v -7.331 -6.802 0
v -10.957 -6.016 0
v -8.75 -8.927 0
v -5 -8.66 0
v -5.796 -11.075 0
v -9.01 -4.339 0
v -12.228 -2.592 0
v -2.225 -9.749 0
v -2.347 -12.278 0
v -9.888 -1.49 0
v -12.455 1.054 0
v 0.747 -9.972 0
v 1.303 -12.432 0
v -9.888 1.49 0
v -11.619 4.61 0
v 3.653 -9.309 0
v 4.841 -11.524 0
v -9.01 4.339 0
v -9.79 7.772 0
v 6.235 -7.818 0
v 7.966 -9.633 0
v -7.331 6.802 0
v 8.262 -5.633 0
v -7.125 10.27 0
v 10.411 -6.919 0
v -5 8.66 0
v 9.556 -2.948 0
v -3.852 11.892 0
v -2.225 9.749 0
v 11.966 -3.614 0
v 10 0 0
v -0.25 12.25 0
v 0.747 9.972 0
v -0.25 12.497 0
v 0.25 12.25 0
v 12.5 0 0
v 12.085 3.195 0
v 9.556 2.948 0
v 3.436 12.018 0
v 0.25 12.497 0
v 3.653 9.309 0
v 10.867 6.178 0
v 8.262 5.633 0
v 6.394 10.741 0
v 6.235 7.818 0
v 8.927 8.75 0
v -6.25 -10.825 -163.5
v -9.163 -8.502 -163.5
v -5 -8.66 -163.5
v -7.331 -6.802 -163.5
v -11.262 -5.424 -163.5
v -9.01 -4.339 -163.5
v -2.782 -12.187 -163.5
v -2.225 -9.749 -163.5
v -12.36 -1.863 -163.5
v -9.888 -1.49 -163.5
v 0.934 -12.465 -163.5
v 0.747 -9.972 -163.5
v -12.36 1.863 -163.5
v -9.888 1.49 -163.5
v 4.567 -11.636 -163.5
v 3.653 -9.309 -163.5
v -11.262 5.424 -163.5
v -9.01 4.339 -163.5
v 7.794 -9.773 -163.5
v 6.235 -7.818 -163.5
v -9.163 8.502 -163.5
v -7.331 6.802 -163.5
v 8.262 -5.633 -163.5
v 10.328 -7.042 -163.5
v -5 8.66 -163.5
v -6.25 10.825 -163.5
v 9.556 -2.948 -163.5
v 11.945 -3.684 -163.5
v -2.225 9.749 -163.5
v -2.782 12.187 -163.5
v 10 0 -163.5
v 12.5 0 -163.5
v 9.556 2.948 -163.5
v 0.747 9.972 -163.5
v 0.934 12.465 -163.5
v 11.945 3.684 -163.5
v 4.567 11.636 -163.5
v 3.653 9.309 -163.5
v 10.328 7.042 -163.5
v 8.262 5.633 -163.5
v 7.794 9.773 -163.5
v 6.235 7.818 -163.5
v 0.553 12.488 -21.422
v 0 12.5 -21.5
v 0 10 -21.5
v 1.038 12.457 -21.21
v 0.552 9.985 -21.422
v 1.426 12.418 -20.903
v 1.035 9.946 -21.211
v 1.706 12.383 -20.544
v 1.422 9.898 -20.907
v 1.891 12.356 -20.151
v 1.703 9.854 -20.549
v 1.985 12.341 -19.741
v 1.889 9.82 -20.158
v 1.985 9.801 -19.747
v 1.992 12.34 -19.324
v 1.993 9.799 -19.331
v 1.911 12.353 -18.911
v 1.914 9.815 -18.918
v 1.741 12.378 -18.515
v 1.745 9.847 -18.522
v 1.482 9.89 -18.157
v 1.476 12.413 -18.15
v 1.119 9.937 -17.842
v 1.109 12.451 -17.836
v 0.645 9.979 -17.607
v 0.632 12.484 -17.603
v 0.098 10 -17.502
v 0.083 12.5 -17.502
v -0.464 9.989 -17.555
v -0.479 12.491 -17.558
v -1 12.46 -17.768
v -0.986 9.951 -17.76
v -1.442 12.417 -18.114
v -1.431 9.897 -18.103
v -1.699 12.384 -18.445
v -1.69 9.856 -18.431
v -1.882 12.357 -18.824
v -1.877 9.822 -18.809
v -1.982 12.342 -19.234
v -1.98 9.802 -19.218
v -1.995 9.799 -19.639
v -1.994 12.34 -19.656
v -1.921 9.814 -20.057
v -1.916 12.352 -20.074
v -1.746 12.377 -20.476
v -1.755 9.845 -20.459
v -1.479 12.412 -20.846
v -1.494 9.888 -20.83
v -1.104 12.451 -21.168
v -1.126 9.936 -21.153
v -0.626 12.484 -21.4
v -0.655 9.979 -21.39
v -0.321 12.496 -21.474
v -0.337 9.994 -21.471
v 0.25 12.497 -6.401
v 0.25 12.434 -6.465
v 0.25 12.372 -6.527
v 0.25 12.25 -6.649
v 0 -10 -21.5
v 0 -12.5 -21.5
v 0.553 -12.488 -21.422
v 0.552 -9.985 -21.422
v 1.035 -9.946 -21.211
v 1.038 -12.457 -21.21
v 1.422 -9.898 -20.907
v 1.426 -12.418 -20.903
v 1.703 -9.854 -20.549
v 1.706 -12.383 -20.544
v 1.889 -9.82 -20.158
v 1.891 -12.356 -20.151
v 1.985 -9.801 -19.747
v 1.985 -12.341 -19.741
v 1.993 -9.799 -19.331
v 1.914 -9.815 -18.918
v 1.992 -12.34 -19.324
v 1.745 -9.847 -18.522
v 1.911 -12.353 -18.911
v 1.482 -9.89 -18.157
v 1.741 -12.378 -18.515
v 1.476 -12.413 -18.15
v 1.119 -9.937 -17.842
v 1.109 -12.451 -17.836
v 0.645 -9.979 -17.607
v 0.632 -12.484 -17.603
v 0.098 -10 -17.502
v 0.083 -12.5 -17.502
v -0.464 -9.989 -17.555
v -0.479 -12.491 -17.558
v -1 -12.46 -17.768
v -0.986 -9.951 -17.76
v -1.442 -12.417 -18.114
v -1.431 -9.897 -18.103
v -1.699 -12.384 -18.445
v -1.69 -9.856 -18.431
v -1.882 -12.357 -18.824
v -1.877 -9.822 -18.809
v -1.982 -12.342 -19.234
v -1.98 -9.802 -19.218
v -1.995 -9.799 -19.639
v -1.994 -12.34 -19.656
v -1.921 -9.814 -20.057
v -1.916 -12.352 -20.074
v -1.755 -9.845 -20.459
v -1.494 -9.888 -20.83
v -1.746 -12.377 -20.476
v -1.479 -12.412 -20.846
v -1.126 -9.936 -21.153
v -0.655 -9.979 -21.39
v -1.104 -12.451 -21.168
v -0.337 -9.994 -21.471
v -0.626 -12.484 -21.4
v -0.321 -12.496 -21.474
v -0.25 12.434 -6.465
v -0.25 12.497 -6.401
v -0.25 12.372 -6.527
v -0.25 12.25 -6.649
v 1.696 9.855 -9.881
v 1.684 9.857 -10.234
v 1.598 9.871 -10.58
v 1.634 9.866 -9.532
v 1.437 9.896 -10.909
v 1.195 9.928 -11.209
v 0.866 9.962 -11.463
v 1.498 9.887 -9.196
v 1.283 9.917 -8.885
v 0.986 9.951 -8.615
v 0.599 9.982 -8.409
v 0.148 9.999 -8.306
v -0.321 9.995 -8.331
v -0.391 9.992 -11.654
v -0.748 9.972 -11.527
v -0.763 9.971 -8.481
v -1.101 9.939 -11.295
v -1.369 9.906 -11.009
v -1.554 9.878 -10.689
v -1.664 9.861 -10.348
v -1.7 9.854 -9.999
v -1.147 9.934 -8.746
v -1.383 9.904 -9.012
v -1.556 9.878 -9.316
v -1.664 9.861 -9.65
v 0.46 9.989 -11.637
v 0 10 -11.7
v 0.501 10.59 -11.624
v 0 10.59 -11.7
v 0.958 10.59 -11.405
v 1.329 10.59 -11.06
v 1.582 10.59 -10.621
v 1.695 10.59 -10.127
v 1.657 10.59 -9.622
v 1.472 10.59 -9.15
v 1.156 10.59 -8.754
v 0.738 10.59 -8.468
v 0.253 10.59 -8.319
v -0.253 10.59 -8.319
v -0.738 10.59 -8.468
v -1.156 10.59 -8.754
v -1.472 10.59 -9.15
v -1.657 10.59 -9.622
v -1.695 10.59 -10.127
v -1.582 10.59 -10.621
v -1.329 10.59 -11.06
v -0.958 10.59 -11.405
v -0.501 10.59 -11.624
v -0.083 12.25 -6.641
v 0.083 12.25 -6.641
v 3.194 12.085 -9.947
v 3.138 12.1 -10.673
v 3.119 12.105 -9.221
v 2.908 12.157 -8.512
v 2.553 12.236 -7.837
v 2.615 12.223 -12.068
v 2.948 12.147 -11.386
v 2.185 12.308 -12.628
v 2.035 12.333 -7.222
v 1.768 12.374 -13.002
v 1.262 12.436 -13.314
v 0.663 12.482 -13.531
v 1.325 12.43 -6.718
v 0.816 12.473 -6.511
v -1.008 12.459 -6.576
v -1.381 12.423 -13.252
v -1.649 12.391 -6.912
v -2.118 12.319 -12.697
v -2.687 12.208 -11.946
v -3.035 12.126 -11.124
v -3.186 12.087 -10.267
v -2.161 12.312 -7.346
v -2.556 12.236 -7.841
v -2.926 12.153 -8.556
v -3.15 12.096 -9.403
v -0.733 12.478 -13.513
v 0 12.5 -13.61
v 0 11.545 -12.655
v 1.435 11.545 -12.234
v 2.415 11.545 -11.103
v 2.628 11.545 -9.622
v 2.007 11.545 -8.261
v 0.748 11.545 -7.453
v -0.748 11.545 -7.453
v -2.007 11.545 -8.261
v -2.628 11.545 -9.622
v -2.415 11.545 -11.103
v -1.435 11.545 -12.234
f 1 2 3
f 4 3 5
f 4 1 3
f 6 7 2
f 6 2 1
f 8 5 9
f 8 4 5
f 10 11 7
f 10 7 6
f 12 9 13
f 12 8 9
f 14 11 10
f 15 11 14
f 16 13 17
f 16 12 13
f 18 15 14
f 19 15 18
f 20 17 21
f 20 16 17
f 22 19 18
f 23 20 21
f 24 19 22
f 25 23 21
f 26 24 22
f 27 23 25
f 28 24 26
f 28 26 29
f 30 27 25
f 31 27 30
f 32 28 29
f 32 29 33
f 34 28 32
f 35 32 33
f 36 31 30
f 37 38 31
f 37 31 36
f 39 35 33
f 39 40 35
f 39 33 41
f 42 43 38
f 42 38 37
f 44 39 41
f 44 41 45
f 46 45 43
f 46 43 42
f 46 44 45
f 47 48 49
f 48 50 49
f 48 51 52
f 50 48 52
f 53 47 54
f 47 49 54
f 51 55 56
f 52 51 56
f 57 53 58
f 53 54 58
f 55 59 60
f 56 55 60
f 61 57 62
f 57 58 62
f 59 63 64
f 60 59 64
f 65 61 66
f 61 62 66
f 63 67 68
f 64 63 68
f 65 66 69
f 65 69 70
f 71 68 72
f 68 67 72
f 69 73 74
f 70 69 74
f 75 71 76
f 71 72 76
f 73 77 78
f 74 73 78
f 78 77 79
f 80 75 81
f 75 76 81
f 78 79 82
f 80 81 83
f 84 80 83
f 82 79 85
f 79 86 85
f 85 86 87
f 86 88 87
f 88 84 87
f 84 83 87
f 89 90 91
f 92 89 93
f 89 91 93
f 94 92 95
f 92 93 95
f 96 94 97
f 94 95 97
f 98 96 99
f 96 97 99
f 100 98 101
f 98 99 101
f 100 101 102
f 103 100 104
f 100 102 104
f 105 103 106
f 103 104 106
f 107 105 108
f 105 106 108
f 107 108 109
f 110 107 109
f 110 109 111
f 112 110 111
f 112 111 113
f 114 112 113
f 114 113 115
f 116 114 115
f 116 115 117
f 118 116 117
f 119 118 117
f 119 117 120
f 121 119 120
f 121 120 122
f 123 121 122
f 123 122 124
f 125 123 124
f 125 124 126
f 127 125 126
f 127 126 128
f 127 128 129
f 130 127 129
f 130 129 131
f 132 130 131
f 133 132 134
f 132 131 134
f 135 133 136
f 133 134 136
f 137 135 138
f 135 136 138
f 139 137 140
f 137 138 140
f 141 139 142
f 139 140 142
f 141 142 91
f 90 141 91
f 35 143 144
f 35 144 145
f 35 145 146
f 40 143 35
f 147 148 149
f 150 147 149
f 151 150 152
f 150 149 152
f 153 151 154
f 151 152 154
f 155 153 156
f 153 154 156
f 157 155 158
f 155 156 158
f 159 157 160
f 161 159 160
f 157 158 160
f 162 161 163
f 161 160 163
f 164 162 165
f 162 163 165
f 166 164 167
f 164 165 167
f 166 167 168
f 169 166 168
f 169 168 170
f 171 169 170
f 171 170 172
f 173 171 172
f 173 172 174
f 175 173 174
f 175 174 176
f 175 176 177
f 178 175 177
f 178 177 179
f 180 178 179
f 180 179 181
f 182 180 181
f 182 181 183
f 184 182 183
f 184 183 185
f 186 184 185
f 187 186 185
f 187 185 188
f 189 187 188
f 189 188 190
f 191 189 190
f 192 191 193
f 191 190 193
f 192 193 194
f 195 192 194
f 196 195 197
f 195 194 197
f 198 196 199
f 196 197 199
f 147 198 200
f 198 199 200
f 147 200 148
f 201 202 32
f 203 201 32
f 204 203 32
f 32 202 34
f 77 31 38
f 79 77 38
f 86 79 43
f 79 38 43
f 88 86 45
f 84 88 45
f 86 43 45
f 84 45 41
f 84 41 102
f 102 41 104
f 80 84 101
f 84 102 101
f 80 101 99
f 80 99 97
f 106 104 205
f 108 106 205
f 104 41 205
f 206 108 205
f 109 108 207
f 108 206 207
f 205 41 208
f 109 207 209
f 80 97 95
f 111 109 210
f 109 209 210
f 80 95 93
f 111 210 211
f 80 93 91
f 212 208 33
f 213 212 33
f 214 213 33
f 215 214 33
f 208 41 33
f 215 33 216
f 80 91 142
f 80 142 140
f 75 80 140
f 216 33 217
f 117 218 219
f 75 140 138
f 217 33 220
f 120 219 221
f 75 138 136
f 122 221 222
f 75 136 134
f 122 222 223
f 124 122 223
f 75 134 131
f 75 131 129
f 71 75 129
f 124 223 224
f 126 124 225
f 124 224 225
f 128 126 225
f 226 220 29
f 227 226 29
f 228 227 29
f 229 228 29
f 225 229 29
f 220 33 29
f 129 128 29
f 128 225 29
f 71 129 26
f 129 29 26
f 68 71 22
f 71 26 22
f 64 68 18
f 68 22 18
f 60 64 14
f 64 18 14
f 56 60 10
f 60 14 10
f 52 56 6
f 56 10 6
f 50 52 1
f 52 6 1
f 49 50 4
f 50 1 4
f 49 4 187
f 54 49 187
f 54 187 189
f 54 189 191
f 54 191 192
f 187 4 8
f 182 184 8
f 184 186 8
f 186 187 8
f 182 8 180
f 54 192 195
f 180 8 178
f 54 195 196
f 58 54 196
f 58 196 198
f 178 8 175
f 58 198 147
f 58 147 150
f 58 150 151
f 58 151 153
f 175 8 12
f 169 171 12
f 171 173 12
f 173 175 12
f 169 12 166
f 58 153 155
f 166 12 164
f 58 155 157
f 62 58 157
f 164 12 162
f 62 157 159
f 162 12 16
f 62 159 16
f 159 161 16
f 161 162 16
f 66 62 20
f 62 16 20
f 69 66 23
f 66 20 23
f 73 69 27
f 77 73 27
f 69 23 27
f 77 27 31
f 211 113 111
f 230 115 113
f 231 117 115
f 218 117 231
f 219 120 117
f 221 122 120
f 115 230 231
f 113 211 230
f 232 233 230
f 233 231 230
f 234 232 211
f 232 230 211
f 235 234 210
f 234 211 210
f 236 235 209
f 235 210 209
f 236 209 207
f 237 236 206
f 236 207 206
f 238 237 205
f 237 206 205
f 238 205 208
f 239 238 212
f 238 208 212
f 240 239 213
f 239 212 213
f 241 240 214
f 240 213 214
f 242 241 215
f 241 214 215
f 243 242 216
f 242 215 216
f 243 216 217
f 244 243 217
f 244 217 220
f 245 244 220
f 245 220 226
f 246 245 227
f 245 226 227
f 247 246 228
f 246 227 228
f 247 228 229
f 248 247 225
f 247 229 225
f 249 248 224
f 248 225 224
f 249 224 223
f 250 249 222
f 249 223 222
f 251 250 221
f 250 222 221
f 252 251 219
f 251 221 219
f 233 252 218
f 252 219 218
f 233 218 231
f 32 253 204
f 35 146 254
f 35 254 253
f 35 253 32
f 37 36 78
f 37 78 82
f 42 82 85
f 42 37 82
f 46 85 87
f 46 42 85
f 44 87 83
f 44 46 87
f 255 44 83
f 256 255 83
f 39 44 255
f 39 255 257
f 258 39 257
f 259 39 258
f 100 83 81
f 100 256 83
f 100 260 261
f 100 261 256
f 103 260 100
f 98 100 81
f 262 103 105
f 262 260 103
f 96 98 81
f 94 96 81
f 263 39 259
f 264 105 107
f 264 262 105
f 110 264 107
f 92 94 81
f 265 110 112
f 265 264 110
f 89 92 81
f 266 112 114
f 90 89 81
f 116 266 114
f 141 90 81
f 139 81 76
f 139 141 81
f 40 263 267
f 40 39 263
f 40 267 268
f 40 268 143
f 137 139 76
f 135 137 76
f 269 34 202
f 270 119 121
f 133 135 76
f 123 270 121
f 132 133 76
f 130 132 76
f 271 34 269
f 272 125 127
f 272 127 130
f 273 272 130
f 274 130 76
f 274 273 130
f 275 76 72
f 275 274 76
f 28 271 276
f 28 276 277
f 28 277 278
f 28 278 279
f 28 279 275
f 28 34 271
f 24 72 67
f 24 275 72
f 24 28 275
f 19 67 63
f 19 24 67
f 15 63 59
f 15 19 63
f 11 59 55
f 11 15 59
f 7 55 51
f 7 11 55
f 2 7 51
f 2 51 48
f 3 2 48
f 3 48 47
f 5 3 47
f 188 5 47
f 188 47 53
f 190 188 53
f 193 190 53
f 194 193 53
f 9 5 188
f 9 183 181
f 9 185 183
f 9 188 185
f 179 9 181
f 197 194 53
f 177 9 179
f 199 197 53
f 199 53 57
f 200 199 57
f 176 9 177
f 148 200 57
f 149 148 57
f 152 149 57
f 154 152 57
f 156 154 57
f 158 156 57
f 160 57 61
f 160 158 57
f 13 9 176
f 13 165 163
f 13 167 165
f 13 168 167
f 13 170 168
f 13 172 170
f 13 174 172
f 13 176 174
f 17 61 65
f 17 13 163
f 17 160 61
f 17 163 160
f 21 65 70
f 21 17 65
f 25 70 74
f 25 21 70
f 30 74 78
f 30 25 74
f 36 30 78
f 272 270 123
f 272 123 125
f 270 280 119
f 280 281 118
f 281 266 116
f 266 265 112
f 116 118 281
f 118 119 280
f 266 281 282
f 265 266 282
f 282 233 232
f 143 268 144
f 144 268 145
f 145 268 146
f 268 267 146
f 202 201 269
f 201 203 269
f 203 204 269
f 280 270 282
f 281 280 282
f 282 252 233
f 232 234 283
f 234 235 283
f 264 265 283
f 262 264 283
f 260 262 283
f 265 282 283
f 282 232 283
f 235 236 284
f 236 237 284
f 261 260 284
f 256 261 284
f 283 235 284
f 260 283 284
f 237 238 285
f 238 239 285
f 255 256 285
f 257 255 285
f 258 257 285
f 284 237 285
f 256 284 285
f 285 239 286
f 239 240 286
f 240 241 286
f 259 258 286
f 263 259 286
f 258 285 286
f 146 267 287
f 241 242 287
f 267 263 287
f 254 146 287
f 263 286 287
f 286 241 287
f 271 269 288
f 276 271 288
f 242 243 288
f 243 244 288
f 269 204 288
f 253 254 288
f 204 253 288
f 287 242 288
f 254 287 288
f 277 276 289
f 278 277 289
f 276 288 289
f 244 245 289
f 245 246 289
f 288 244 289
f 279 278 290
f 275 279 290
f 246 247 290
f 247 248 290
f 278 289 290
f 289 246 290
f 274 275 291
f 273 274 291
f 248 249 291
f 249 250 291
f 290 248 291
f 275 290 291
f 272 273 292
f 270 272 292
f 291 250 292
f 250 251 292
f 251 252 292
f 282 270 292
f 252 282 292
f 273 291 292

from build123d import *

# Parameters (mm, degrees)
SKETCH1_R                     = 12.5
SKETCH1_R_2                   = 10
BOSS_EXTRUDE1_DEPTH           = 163.5
CSK_FOR_M3_SFHCS1_D           = 3.4
CSK_FOR_M3_SFHCS1_DEPTH       = 10
CSK_FOR_M3_SFHCS1_CSINK_D     = 7.22
CSK_FOR_M3_SFHCS1_CSINK_ANGLE = 90
CSK_FOR_M3_SFHCS1_TIP         = 1.021463052
F_4_0MM_DOWEL_HOLE1_D         = 4
SKETCH8_W                     = 10
SKETCH8_H                     = 0.5
CUT_EXTRUDE1_DEPTH            = 0.25


with BuildPart() as part:
    # Sketch1 → Boss-Extrude1 (new body)
    with BuildSketch(Plane.XY):
        Circle(SKETCH1_R)
        Circle(SKETCH1_R_2, mode=Mode.SUBTRACT)
    extrude(amount=-BOSS_EXTRUDE1_DEPTH)

    # CSK for M3 SFHCS1
    with Locations(Plane.ZX.offset(12.5)):
        with Locations((-10, 0)):
            CounterSinkHole(CSK_FOR_M3_SFHCS1_D / 2, CSK_FOR_M3_SFHCS1_CSINK_D / 2, depth=CSK_FOR_M3_SFHCS1_DEPTH, counter_sink_angle=CSK_FOR_M3_SFHCS1_CSINK_ANGLE)
            with Locations((0, 0, -(CSK_FOR_M3_SFHCS1_DEPTH + CSK_FOR_M3_SFHCS1_TIP / 2))):  # 118° drill point
                Cone(0, CSK_FOR_M3_SFHCS1_D / 2, CSK_FOR_M3_SFHCS1_TIP, mode=Mode.SUBTRACT)

    # Ø4.0mm Dowel Hole1 (through all)
    with Locations(Plane.ZX.offset(12.5)):
        with Locations((-19.5, 0)):
            Hole(F_4_0MM_DOWEL_HOLE1_D / 2)

    # Sketch8 → Cut-Extrude1 (cut)
    with BuildSketch(Plane.ZX.offset(12.5)):
        with Locations((-5, 0)):
            Rectangle(SKETCH8_W, SKETCH8_H)
    extrude(amount=-CUT_EXTRUDE1_DEPTH, mode=Mode.SUBTRACT)


solid = part.part
